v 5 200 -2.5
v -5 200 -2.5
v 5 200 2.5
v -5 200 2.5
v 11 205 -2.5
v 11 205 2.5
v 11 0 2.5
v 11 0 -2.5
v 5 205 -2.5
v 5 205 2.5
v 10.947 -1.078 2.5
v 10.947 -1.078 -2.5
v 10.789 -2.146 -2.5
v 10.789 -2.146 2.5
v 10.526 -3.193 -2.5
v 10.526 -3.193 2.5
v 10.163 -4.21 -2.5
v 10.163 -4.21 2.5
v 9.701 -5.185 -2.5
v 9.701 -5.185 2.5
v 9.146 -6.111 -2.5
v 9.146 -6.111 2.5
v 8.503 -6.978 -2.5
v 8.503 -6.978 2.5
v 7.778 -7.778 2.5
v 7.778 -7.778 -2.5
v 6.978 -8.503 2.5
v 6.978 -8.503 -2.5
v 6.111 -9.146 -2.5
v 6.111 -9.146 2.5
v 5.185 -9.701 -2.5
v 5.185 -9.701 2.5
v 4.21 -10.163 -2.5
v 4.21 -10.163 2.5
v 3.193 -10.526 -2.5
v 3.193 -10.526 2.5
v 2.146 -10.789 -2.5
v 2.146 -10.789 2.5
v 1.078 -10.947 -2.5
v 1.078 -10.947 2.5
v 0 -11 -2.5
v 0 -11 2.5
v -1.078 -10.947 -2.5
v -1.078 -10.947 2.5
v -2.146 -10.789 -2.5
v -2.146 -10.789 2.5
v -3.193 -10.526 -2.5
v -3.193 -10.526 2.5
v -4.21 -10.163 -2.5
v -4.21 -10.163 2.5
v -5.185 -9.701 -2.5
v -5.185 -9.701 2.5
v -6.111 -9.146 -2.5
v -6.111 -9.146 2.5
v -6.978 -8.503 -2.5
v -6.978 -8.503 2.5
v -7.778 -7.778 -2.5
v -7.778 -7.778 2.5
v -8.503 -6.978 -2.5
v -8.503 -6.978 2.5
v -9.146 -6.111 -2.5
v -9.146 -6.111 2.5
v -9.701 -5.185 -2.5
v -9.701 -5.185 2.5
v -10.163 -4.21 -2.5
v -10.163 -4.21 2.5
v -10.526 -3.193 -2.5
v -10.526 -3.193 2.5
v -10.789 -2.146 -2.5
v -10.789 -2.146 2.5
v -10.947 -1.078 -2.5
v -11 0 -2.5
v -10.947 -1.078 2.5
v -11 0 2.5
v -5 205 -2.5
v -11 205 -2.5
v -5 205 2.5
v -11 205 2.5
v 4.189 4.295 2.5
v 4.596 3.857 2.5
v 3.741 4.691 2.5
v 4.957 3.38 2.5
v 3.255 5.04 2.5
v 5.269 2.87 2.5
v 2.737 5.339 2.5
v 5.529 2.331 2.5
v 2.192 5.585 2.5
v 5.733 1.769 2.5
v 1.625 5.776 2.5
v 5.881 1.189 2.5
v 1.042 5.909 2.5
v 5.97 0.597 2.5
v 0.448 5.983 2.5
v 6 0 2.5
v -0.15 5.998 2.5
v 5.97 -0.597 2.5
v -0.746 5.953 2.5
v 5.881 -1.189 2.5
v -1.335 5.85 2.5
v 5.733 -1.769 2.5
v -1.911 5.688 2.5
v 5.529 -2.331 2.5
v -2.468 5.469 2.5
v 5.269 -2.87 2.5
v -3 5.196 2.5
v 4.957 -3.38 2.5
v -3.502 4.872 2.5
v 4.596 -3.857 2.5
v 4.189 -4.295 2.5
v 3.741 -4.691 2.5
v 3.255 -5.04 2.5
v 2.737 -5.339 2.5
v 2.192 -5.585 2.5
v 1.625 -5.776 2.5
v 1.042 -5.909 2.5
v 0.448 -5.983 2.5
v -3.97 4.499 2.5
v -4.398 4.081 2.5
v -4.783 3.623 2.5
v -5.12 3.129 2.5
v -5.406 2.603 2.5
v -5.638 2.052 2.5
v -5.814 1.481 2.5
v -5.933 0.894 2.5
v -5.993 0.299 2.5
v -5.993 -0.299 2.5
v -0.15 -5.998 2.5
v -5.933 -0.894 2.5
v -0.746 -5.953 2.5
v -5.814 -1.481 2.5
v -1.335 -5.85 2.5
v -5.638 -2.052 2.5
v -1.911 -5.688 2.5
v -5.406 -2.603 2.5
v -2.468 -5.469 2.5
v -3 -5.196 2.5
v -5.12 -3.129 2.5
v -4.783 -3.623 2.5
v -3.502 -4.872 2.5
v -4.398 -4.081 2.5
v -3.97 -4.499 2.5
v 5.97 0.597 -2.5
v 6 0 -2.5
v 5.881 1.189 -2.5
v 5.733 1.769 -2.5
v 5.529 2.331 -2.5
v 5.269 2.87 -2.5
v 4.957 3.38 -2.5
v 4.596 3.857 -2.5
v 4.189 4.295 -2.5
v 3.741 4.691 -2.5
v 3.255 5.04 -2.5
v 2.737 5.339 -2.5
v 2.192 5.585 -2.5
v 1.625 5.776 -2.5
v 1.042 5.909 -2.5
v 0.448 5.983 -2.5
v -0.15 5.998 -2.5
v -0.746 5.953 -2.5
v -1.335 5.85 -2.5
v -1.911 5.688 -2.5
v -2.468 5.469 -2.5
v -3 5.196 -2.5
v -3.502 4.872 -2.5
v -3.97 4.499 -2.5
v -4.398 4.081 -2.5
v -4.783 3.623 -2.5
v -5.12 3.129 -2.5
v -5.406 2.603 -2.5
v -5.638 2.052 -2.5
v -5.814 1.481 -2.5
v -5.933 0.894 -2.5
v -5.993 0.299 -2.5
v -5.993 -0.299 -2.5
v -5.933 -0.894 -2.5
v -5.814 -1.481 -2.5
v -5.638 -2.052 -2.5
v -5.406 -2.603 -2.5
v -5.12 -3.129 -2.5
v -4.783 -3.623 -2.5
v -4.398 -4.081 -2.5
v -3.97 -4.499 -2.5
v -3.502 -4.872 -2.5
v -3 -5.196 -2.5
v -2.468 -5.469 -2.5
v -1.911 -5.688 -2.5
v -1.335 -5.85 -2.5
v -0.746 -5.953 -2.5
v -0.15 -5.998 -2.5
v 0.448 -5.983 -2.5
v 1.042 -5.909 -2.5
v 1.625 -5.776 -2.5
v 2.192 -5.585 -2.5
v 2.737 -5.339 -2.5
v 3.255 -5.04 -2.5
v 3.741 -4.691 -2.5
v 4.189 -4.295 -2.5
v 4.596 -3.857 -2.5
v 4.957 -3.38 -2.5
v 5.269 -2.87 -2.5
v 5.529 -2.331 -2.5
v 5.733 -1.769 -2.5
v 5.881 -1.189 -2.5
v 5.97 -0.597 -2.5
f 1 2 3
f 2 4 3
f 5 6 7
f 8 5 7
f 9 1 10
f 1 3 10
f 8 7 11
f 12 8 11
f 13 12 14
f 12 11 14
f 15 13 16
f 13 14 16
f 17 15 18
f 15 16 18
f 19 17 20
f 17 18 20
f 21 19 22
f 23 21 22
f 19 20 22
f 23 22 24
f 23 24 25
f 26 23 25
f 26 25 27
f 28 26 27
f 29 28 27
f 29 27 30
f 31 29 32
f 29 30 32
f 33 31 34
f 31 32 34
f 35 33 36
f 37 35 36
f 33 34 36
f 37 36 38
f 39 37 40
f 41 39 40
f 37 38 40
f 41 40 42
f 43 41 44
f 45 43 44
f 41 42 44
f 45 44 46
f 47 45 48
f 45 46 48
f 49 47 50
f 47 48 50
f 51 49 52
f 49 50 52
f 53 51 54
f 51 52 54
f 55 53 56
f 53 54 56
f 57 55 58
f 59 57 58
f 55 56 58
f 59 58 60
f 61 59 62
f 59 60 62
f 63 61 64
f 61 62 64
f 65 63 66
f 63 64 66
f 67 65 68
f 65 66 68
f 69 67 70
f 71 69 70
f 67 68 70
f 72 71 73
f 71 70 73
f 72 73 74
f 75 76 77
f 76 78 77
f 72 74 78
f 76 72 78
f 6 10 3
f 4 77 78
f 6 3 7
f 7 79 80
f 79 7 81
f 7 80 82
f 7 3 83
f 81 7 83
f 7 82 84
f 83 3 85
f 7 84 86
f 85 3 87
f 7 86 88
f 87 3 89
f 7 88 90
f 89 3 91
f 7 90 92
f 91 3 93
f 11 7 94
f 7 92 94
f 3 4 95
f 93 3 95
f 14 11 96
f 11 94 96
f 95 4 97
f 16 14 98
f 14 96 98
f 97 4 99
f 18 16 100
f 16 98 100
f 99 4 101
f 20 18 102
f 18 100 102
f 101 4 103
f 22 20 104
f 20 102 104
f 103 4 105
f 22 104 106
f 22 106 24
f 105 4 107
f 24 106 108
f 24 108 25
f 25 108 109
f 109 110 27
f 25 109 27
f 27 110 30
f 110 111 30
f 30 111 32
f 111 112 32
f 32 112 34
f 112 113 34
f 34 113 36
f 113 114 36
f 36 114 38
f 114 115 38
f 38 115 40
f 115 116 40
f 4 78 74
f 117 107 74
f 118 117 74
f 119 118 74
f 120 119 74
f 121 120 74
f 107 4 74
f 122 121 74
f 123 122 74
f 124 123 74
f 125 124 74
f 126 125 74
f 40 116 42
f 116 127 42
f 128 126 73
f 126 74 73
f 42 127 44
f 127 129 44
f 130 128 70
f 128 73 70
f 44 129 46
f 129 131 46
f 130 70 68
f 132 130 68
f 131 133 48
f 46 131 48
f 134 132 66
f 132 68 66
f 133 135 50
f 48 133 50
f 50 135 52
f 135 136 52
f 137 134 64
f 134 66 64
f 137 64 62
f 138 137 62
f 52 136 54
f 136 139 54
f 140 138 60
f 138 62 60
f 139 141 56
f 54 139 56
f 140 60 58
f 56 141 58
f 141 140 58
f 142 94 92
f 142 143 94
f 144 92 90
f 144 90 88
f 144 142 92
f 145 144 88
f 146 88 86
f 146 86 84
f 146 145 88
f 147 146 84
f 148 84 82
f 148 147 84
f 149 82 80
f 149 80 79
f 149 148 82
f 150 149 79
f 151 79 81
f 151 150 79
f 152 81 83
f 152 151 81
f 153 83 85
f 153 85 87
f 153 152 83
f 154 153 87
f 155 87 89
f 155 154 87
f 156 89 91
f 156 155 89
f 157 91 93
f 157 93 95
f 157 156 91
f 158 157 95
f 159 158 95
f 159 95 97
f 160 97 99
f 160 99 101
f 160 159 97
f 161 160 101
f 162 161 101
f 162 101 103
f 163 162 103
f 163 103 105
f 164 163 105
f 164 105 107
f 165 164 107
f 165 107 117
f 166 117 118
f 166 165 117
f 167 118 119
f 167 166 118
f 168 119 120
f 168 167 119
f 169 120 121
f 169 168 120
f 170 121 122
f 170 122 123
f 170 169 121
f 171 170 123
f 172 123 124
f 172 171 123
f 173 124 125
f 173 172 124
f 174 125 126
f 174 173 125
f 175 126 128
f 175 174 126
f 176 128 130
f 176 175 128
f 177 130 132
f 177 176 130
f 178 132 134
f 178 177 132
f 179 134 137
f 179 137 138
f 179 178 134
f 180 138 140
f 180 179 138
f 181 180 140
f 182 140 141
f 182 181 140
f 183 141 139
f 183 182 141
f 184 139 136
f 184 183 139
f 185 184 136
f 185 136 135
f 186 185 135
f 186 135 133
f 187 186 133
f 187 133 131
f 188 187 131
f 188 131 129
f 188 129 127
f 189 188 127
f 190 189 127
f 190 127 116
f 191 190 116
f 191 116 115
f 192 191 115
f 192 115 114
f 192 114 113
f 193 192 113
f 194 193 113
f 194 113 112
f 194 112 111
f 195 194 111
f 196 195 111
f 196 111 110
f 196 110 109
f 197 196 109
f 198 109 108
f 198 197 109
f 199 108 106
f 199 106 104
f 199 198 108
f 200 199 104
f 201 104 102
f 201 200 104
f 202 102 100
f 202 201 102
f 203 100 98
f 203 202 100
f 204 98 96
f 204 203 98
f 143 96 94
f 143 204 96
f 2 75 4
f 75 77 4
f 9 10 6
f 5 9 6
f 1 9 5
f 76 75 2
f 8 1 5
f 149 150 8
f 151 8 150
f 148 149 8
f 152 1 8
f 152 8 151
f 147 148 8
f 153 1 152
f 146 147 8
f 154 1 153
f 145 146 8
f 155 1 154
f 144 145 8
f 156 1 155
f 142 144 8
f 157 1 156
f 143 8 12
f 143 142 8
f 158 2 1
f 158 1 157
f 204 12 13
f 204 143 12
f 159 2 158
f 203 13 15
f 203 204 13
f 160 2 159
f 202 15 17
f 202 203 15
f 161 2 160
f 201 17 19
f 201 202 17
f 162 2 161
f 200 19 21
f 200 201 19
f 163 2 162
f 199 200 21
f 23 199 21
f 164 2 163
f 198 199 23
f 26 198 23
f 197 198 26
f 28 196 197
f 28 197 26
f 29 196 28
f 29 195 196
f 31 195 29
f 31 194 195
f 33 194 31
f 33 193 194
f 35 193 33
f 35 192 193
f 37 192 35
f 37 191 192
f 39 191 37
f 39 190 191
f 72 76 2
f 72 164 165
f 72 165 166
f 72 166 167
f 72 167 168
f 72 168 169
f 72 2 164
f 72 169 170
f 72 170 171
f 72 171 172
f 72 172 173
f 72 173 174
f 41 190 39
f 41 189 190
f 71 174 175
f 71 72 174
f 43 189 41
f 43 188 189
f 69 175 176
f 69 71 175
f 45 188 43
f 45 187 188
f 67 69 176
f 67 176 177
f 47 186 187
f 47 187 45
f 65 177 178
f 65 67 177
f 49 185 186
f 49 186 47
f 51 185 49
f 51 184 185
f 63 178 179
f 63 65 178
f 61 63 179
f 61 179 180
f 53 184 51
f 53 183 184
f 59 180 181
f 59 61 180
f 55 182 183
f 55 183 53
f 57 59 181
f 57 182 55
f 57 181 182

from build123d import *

# Parameters (mm, degrees)
SKETCH1_R           = 6
BOSS_EXTRUDE1_DEPTH = 2.5


with BuildPart() as part:
    # Sketch1 → Boss-Extrude1 (new, symmetric)
    with BuildSketch(Plane(origin=(0, 0, 0), x_dir=(0, 1, 0), z_dir=(0, 0, 1))):
        with BuildLine():
            Line((0, 11), (205, 11))
            Line((205, 11), (205, 5))
            Line((205, 5), (200, 5))
            Line((200, 5), (200, -5))
            Line((200, -5), (205, -5))
            Line((205, -5), (205, -11))
            Line((205, -11), (0, -11))
            ThreePointArc((0, -11), (-11, 0), (0, 11))
        make_face()
        with Locations(Location((0, 0, 0), (0, 0, 270))):
            Circle(SKETCH1_R, mode=Mode.SUBTRACT)
    extrude(amount=BOSS_EXTRUDE1_DEPTH, both=True)


solid = part.part
